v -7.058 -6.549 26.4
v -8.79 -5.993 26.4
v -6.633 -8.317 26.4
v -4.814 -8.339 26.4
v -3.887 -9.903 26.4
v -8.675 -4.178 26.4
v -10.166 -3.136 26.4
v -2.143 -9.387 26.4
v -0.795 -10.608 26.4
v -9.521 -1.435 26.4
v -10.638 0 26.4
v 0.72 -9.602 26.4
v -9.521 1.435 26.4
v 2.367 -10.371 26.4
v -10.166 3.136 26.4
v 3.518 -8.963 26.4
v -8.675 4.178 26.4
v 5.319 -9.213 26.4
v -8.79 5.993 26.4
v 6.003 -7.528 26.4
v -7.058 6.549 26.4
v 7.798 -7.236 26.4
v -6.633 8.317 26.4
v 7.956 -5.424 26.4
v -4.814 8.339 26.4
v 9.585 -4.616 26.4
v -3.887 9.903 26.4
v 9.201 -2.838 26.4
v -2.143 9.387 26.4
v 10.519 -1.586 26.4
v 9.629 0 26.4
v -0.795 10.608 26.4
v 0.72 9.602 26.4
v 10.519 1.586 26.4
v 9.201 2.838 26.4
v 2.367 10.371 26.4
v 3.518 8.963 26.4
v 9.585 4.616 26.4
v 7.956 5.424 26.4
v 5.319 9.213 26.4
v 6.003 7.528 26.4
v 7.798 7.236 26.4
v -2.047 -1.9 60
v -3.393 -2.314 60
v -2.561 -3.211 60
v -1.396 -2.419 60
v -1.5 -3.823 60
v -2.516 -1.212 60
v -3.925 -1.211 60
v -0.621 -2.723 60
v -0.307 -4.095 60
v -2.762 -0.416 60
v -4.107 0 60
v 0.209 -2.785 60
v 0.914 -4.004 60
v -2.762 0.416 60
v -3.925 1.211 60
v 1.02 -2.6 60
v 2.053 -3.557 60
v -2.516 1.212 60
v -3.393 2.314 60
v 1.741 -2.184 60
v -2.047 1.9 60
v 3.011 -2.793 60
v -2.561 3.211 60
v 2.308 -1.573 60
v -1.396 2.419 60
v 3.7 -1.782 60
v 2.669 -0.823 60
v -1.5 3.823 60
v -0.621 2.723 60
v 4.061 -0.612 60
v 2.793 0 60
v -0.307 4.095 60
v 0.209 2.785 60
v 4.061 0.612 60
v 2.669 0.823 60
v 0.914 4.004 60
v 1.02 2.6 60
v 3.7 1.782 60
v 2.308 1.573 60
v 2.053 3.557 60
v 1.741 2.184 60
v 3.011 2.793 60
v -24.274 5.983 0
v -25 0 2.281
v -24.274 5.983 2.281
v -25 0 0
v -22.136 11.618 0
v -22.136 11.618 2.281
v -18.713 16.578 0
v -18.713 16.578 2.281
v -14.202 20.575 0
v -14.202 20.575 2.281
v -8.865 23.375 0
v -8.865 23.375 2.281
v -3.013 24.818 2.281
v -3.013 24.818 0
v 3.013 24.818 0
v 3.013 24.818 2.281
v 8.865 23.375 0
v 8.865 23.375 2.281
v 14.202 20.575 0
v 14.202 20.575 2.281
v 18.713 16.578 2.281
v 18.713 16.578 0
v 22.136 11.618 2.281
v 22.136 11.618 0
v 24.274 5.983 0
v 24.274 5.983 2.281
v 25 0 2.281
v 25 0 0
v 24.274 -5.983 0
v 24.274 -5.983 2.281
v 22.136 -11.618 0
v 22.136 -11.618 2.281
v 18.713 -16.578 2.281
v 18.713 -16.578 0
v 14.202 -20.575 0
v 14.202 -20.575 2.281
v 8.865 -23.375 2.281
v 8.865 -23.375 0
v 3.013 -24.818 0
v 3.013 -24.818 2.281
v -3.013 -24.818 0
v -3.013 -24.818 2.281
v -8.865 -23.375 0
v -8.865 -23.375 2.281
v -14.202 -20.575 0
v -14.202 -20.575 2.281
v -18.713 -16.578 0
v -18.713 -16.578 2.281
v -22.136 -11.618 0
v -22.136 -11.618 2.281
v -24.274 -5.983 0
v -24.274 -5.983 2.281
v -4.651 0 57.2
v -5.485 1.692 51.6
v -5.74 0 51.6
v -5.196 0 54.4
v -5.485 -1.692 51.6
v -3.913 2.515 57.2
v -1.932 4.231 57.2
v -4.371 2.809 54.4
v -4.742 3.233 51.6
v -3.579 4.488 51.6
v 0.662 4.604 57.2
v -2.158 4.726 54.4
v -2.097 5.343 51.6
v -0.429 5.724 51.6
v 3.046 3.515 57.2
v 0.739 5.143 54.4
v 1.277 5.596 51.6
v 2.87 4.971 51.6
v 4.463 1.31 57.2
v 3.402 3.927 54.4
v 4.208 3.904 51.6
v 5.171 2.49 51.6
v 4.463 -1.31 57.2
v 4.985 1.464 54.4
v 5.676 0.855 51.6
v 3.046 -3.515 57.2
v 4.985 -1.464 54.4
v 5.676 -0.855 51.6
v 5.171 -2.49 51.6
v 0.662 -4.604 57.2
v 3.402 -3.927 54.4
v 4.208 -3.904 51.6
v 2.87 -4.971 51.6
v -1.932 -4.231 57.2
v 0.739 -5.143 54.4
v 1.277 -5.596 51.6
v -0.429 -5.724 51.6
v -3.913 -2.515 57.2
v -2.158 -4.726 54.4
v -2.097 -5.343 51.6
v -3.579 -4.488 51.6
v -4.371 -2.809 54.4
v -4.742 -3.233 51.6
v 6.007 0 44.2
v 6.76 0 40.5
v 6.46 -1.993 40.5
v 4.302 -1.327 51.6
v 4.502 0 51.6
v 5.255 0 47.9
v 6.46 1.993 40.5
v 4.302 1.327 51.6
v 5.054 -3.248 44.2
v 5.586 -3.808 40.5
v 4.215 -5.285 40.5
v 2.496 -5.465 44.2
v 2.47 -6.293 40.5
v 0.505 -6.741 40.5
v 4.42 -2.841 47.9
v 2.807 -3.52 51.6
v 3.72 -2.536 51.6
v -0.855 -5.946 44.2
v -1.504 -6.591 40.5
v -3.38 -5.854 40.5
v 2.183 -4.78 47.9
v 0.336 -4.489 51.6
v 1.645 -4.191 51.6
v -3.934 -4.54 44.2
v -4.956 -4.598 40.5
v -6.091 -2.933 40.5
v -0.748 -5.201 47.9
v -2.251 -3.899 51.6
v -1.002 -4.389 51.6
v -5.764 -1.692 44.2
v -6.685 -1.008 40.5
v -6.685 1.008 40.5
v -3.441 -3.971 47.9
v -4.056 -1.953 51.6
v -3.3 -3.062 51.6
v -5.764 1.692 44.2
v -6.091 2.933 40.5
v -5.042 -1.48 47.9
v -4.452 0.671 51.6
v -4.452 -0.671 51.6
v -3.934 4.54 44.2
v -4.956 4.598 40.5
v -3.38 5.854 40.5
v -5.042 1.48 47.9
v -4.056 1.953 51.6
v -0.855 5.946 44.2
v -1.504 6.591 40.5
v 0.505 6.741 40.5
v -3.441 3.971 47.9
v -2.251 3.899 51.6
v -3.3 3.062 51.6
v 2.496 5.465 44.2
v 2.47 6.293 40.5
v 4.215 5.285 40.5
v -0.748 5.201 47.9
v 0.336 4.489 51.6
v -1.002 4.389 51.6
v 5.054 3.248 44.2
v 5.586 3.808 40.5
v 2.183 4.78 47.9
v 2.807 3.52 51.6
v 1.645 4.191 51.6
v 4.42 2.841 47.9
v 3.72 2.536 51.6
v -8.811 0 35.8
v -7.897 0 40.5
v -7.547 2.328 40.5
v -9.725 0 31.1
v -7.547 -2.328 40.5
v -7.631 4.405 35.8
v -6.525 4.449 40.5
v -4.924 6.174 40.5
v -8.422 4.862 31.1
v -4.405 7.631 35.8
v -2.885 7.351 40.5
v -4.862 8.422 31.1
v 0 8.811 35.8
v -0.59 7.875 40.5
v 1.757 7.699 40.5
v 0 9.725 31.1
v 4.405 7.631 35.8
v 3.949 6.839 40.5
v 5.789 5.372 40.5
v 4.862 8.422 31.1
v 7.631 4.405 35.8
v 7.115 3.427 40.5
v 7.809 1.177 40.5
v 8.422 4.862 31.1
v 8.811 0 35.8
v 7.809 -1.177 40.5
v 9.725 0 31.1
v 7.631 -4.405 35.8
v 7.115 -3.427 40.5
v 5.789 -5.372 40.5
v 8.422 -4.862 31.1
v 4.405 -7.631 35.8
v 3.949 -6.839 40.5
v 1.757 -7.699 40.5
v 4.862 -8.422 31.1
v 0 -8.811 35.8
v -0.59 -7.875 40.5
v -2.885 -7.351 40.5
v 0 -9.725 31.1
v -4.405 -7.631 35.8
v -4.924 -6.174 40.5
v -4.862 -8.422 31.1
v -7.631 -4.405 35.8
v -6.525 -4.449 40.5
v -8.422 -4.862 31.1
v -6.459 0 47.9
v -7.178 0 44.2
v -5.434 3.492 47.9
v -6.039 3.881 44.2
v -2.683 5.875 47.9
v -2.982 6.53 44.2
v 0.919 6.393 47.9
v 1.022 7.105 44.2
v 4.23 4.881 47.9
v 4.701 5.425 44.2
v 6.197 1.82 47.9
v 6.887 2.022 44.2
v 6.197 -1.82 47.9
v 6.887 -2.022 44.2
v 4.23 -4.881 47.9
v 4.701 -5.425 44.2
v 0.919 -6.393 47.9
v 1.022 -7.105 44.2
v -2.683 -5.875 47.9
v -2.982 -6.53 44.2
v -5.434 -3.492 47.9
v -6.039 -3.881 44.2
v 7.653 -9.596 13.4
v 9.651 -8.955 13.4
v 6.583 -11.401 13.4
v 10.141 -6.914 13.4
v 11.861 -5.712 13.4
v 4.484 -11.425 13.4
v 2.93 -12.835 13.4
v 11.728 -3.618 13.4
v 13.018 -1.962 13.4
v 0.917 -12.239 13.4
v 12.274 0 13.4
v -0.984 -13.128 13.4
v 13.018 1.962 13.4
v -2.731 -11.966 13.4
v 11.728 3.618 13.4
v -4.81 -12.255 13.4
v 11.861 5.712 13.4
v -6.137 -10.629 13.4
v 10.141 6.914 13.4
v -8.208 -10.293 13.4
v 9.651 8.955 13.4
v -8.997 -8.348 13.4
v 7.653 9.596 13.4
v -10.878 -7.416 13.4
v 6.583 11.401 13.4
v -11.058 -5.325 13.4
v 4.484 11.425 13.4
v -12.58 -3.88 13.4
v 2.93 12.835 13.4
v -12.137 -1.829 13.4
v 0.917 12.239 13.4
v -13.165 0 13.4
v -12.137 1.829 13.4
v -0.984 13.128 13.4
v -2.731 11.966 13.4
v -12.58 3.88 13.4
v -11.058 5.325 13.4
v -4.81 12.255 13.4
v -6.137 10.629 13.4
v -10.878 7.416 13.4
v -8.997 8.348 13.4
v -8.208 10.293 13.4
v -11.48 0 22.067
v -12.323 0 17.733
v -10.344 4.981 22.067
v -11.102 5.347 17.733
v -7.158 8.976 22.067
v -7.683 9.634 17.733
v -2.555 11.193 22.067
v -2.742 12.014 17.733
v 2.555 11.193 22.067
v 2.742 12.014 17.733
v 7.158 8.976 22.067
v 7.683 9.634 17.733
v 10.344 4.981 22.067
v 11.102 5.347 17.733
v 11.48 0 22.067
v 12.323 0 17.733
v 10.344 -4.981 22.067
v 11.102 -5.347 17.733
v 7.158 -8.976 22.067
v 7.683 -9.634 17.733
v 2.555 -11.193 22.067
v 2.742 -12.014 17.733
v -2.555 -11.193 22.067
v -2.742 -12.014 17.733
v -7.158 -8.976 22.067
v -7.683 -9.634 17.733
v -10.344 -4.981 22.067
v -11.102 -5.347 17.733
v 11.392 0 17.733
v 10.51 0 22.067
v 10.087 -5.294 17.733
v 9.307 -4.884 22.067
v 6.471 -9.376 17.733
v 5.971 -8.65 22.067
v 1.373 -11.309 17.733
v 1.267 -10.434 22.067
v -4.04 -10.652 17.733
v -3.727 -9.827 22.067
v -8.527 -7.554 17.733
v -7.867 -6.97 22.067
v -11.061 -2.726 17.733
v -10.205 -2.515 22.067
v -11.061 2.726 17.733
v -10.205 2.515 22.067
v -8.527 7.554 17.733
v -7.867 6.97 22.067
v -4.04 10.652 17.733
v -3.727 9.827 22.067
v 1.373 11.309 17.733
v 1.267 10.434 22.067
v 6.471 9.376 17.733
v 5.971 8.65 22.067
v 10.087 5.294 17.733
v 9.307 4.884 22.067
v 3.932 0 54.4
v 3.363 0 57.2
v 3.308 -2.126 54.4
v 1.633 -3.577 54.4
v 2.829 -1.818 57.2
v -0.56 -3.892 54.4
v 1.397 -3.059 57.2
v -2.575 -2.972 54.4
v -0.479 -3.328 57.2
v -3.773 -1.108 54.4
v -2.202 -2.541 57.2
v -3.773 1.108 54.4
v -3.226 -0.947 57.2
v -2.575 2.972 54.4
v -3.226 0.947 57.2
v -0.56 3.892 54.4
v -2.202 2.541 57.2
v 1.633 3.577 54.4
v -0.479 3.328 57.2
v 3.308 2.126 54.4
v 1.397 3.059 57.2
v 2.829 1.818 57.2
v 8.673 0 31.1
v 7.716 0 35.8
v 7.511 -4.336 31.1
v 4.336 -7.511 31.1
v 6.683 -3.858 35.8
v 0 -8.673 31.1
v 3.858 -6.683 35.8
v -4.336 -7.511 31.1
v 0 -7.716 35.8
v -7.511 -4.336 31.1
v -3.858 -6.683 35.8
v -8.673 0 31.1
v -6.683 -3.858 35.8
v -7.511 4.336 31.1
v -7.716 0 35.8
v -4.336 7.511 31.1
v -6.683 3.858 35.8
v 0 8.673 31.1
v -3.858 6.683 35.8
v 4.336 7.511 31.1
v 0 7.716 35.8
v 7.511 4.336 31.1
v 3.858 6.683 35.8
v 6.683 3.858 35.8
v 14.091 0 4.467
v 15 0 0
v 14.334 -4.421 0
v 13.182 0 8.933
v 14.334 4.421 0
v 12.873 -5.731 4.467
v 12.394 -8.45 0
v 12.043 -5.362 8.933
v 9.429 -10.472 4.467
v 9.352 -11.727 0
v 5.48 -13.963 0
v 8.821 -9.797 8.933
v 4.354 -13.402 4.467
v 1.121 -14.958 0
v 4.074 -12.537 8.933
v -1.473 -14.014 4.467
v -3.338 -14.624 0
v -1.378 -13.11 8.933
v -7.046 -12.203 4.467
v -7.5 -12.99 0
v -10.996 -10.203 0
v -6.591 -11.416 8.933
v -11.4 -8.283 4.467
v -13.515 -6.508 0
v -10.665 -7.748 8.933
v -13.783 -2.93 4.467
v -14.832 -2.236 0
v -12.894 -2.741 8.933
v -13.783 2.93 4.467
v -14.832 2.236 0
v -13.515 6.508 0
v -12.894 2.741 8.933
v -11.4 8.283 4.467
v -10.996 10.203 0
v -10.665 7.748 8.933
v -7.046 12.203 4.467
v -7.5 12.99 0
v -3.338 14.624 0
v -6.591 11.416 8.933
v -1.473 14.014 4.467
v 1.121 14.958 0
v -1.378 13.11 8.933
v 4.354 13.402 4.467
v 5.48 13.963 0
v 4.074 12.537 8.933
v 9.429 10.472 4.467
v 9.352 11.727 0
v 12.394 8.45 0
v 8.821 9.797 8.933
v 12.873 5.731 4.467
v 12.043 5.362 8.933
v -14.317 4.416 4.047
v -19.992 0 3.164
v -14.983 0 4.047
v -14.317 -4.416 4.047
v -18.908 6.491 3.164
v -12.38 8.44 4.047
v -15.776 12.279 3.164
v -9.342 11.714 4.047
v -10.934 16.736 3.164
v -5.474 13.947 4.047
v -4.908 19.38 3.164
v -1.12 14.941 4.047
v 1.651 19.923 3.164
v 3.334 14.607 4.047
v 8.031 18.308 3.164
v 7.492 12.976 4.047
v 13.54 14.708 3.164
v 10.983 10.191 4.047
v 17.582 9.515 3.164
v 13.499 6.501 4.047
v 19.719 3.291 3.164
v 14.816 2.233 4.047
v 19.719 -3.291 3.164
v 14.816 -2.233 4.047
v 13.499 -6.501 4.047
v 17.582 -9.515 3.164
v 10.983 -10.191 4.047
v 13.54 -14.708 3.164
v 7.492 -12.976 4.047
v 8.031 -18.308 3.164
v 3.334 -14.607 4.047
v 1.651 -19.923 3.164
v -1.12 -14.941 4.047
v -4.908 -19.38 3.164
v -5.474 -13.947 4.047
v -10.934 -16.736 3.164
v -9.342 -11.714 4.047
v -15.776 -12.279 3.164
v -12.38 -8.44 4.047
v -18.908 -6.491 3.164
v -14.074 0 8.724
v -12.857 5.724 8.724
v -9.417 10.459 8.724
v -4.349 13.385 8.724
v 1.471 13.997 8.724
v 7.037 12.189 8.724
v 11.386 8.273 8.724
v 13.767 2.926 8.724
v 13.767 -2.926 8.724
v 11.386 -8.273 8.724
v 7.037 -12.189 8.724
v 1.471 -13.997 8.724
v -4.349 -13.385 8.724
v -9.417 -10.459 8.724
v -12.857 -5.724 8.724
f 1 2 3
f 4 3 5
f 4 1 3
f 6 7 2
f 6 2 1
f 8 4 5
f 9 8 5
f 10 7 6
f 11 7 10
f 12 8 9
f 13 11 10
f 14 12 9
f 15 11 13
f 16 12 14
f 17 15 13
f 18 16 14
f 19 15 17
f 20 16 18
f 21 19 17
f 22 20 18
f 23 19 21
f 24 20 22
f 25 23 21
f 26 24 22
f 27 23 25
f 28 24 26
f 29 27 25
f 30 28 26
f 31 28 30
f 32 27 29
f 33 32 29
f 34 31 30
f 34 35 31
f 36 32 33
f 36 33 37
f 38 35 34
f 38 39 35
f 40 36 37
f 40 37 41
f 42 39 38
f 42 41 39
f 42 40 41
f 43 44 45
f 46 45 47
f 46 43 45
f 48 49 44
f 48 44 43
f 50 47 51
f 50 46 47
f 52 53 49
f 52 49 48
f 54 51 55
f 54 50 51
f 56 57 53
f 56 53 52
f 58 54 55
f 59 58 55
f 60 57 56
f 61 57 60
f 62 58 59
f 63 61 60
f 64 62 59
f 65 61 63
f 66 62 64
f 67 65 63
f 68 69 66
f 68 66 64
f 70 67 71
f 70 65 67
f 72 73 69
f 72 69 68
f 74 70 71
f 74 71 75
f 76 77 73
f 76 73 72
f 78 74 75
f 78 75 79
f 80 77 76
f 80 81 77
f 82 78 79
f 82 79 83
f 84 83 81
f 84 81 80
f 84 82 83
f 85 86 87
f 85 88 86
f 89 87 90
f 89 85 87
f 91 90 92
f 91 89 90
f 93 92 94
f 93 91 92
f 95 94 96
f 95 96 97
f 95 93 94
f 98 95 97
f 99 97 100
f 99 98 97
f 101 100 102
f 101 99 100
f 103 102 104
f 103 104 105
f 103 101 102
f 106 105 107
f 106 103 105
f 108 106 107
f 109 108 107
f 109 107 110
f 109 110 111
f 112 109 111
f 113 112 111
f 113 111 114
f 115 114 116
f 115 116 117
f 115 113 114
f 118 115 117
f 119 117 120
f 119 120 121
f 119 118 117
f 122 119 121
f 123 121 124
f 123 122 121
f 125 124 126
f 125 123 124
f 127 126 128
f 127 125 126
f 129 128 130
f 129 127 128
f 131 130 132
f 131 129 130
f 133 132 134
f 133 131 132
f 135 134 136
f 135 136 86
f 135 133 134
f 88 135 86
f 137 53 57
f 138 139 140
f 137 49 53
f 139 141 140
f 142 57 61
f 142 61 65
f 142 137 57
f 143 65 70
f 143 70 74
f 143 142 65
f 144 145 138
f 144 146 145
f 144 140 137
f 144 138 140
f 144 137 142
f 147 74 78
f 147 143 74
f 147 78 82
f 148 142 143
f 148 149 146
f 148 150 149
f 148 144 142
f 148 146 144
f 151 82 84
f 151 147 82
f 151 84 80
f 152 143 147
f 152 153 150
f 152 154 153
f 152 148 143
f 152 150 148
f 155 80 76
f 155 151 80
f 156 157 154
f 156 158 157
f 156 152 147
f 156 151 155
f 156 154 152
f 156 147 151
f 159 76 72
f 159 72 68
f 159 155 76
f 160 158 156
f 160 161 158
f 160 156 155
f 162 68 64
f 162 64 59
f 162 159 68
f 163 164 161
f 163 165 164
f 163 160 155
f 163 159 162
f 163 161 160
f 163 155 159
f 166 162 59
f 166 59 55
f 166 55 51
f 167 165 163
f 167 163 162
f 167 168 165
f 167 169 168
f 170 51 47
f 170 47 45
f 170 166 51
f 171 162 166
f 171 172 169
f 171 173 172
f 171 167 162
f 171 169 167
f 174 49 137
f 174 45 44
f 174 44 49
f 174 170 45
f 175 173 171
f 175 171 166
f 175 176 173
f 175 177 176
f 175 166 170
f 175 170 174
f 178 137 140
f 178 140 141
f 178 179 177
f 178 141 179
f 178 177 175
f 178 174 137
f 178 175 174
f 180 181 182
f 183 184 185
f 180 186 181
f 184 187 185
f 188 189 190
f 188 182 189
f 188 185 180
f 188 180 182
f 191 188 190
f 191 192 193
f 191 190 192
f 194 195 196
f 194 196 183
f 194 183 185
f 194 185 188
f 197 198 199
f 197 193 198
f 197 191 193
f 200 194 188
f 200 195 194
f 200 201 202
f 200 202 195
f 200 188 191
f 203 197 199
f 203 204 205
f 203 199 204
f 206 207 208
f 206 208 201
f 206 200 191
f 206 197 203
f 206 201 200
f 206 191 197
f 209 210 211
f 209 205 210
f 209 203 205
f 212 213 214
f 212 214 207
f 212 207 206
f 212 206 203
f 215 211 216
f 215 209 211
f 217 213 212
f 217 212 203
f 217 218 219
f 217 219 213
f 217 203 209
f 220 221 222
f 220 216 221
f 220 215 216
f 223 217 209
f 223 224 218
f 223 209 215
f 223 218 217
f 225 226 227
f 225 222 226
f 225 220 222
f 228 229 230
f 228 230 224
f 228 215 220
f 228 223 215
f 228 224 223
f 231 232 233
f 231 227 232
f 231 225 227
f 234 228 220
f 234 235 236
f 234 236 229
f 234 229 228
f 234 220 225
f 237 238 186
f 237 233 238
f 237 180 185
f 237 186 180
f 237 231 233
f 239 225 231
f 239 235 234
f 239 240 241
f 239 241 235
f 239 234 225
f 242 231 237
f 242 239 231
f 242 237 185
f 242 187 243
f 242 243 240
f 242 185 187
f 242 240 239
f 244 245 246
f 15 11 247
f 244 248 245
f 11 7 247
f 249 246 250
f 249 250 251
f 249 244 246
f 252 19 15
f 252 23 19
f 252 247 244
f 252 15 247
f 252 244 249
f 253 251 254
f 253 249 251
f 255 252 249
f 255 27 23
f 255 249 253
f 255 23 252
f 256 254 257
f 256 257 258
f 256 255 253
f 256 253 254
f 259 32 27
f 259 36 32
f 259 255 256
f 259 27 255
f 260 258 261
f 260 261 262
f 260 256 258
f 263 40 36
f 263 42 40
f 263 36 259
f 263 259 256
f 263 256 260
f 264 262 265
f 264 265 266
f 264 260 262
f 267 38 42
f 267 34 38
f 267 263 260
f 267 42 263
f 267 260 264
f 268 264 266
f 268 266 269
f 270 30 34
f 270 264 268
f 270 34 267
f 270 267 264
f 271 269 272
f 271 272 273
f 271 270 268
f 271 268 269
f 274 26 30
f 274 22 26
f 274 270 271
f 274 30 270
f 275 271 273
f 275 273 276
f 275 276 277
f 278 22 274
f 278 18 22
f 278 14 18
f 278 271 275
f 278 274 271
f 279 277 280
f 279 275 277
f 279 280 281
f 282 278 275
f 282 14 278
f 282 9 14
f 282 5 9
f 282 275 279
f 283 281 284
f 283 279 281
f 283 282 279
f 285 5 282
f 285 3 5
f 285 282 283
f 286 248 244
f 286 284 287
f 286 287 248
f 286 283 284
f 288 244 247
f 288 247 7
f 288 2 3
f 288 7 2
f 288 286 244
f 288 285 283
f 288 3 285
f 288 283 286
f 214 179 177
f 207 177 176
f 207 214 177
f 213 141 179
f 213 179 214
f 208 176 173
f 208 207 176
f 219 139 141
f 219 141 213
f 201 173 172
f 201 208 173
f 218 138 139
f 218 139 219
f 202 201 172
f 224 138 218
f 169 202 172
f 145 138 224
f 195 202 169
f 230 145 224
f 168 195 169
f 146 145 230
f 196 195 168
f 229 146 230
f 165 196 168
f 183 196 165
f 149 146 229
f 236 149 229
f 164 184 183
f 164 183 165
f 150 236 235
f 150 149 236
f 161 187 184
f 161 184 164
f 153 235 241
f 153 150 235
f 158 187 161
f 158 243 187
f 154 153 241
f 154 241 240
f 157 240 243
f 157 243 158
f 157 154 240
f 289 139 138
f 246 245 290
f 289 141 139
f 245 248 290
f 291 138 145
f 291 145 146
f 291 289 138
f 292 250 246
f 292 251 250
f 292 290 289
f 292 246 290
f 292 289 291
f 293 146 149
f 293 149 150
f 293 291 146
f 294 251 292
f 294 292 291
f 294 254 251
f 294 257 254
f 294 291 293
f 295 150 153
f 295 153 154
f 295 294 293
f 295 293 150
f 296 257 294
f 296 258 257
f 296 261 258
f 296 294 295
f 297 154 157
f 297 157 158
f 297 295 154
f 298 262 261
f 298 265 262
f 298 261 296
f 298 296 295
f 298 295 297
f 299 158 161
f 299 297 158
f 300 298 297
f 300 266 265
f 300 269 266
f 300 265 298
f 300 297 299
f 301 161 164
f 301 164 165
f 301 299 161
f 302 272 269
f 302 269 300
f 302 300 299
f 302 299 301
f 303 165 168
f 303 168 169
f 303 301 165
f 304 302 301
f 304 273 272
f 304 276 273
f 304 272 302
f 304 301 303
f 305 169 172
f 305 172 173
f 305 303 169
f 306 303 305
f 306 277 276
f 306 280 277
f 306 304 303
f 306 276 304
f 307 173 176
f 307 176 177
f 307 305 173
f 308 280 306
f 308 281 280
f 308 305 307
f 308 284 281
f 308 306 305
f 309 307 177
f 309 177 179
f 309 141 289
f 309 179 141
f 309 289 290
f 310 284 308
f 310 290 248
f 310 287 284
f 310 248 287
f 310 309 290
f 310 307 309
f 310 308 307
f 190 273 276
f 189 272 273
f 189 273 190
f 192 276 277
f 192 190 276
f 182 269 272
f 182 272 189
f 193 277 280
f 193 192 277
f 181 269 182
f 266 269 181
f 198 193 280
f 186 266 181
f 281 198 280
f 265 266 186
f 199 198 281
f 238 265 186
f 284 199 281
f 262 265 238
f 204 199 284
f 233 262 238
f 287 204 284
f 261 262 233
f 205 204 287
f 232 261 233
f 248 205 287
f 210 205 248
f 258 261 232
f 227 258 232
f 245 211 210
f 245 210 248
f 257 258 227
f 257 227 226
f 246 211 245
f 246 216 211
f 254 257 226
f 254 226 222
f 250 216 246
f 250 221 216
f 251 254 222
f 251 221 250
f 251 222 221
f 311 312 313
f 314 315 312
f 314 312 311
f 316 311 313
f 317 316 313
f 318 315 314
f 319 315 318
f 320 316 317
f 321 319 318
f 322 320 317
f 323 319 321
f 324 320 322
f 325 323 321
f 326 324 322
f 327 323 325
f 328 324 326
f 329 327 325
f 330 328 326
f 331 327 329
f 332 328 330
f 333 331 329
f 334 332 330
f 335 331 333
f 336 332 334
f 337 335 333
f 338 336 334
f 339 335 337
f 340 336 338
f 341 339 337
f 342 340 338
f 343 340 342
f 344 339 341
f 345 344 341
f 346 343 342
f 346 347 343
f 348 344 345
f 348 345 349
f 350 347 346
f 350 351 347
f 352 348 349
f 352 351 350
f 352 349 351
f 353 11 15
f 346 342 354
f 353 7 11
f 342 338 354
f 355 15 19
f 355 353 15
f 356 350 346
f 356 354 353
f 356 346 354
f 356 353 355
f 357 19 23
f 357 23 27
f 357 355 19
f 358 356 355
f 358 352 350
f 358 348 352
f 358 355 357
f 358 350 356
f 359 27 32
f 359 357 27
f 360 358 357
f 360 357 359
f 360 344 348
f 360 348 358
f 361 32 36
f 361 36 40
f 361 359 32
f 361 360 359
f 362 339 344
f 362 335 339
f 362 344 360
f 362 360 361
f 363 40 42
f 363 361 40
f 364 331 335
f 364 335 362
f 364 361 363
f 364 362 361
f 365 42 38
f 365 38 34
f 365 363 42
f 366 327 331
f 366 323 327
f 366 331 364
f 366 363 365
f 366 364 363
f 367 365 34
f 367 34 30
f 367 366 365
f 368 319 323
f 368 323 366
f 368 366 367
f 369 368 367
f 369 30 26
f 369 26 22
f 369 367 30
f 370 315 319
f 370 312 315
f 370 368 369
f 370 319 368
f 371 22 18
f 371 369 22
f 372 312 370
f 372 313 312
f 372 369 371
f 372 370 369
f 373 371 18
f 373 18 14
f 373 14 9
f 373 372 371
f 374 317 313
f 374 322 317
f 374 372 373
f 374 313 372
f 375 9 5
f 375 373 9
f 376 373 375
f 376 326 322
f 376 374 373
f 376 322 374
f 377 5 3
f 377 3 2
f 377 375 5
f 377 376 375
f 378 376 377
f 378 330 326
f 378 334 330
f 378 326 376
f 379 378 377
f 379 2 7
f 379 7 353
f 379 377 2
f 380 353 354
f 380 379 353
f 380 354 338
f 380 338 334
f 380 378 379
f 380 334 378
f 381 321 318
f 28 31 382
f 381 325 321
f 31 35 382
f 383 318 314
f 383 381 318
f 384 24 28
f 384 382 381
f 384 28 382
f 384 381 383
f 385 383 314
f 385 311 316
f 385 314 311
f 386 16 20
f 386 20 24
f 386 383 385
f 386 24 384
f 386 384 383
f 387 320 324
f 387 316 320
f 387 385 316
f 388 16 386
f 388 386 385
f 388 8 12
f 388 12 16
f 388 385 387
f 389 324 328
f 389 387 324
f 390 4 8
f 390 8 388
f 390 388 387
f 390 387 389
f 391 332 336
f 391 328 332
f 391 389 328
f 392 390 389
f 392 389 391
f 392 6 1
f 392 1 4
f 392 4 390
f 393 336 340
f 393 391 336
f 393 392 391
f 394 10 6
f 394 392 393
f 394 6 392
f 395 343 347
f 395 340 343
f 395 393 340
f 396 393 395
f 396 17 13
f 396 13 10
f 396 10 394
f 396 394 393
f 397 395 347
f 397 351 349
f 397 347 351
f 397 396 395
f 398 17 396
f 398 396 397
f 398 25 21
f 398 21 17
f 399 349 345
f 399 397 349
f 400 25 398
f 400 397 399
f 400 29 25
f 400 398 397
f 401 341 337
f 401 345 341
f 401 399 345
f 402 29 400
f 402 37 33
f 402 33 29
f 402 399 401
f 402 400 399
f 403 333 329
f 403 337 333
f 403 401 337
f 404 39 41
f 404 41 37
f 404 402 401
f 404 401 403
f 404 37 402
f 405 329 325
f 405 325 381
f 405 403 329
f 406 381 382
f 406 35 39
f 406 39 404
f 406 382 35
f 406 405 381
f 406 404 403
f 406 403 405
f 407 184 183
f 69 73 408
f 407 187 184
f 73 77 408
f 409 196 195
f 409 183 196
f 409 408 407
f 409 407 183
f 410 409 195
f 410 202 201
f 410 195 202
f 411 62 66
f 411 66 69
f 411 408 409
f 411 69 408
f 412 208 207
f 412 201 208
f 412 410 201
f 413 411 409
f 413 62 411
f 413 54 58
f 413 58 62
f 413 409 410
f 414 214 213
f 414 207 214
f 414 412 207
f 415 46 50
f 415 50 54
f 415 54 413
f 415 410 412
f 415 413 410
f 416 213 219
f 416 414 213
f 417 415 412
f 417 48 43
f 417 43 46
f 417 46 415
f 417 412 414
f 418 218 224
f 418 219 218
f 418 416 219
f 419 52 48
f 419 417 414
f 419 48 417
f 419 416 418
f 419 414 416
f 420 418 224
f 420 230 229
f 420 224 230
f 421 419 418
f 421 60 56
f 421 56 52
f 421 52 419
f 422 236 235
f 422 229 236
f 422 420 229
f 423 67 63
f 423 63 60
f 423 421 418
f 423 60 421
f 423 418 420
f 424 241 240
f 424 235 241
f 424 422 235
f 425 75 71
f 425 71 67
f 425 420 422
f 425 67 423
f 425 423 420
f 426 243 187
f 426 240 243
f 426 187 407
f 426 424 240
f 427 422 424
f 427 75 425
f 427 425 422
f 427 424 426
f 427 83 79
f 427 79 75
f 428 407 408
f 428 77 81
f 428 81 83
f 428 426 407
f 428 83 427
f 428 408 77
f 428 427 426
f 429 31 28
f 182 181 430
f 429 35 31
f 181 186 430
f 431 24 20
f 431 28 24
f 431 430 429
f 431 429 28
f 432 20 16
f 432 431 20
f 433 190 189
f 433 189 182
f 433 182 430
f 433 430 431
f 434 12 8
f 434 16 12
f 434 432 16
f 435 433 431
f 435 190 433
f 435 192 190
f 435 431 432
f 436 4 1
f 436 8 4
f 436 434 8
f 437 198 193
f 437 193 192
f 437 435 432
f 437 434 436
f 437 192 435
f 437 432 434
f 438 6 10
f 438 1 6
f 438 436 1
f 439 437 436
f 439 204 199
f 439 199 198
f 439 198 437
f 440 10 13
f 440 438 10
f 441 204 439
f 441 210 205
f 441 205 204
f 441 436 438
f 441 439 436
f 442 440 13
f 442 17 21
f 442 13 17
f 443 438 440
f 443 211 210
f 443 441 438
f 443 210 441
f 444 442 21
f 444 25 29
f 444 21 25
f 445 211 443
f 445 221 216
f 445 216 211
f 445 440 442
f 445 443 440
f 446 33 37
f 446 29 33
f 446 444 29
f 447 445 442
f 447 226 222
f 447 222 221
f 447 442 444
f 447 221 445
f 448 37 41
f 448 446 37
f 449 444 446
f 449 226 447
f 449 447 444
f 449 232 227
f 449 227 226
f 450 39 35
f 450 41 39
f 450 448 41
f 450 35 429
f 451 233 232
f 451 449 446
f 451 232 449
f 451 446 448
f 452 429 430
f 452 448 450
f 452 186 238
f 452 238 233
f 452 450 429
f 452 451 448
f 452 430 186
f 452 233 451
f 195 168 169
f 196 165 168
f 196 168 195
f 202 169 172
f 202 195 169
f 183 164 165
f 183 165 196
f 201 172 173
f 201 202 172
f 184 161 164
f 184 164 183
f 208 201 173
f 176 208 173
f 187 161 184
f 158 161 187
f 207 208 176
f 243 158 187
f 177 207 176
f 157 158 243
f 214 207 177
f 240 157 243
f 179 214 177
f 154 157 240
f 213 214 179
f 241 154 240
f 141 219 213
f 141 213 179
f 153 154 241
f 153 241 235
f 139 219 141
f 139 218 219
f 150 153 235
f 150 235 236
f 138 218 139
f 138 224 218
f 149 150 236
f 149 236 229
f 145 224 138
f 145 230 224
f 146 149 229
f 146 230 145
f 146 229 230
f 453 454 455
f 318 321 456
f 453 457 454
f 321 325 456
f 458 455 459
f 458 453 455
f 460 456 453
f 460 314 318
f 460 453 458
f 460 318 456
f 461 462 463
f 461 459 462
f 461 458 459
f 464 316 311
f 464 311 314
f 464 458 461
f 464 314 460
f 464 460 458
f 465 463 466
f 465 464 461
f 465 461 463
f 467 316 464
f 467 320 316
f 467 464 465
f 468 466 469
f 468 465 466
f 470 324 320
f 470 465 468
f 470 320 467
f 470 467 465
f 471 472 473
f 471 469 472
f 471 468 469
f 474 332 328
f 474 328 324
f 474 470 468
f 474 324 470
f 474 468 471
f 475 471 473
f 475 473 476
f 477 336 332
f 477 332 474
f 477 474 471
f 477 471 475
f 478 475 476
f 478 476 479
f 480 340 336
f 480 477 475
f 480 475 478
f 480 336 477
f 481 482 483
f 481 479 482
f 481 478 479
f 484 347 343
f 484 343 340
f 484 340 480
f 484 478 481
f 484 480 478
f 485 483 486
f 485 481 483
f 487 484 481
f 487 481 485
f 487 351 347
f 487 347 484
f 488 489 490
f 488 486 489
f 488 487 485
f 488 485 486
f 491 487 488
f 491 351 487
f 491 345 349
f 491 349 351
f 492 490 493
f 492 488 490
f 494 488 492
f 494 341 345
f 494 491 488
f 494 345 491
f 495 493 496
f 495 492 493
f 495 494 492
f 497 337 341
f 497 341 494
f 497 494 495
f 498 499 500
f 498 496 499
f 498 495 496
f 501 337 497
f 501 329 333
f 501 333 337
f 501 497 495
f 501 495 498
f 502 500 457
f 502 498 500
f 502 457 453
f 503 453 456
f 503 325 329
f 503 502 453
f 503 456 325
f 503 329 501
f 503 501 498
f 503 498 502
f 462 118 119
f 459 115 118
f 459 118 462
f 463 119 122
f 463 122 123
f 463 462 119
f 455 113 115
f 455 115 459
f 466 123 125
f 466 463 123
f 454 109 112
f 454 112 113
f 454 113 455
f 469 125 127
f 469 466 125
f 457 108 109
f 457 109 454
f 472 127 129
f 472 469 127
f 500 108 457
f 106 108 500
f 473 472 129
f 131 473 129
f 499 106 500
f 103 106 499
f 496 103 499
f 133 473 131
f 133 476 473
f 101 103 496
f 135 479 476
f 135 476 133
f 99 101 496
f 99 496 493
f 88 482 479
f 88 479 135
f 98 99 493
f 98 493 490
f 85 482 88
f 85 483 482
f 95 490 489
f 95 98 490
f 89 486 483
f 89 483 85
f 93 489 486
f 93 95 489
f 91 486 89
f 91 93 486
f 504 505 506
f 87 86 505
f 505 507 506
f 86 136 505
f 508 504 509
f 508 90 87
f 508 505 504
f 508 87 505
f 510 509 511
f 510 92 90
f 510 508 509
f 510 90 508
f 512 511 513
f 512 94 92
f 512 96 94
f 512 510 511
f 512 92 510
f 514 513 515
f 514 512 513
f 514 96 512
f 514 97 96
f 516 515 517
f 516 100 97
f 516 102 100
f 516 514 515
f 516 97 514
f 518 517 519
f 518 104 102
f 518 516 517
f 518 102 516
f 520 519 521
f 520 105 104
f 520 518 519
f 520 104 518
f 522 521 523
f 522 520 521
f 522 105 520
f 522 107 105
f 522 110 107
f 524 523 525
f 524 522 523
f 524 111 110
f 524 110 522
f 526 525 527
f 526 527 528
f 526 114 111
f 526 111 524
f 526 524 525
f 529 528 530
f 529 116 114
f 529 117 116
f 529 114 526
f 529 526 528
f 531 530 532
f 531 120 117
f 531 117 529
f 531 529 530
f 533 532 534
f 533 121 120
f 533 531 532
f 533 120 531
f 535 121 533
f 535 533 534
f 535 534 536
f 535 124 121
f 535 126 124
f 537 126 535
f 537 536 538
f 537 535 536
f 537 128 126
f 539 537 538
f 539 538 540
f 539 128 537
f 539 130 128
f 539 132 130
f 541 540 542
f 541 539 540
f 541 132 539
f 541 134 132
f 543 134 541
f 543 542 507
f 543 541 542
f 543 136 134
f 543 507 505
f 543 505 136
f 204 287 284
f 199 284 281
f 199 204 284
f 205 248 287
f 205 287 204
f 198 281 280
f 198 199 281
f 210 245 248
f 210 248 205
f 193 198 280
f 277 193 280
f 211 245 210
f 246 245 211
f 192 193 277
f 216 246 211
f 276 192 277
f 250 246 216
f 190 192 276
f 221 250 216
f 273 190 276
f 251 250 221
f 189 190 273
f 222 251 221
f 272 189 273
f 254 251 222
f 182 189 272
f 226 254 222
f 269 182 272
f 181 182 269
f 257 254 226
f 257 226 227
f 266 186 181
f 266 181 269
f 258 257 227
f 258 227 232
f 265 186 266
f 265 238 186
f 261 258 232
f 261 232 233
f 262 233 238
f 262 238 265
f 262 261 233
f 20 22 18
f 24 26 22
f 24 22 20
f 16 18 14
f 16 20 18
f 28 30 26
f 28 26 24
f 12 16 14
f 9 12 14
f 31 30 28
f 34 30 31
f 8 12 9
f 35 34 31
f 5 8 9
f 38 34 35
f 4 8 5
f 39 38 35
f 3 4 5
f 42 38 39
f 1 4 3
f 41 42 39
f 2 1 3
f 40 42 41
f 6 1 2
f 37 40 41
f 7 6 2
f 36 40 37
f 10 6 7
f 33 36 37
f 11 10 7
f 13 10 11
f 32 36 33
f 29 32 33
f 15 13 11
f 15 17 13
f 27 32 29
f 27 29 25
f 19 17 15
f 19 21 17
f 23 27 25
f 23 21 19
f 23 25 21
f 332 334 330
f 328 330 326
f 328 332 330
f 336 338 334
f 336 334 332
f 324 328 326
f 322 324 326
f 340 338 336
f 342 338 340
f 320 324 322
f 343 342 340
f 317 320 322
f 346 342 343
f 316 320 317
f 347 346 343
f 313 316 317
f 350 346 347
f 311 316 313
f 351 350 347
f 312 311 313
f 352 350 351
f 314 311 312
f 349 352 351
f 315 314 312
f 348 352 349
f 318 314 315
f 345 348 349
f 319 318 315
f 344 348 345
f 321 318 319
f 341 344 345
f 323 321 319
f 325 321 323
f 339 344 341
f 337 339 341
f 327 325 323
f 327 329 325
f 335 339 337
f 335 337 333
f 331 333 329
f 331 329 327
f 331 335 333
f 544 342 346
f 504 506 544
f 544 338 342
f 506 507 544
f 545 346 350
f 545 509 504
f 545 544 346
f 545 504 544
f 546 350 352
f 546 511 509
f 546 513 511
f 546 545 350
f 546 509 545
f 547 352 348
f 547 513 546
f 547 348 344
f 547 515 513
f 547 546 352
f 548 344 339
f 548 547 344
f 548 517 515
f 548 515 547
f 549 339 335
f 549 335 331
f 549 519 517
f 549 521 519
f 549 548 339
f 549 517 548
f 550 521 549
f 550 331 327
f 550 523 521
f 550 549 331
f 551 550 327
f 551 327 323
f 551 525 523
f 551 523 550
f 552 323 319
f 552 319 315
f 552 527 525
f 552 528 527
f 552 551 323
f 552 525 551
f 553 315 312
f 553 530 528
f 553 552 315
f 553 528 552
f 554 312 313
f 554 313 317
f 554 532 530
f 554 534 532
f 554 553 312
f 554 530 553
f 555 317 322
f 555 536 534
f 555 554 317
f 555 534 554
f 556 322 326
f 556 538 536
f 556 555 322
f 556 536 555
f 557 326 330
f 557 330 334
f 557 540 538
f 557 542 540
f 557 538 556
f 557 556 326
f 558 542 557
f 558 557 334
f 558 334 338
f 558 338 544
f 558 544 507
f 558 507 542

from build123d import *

# Parameters (mm, degrees)
F6_R     = 15
F7_DEPTH = 62.23
F7_TAPER = 11.5


with BuildPart() as f1:
    # F0 (on Front) → F1 (revolve)
    with BuildSketch(Plane.XZ):
        Polygon((-5.7397772641, 51.6), (0, 51.6), (0, 60), (-4.1069826674, 60), align=None)
    revolve(axis=Axis((0, 0, 30), (0, 0, -1)))


with BuildPart() as f2:
    # F0 (on Front) → F2 (revolve)
    with BuildSketch(Plane.XZ):
        Polygon((-7.8973986956, 40.5), (0, 40.5), (0, 51.6), (-5.7397772641, 51.6), align=None)
    revolve(axis=Axis((0, 0, 30), (0, 0, -1)))


with BuildPart() as f3:
    # F0 (on Front) → F3 (revolve)
    with BuildSketch(Plane.XZ):
        Polygon((-10.6381610544, 26.4), (0, 26.4), (0, 40.5), (-7.8973986956, 40.5), align=None)
    revolve(axis=Axis((0, 0, 30), (0, 0, -1)))


with BuildPart() as f4:
    # F0 (on Front) → F4 (revolve)
    with BuildSketch(Plane.XZ):
        Polygon((-13.1651050732, 13.4), (0, 13.4), (0, 26.4), (-10.6381610544, 26.4), align=None)
    revolve(axis=Axis((0, 0, 30), (0, 0, -1)))


with BuildPart() as f5:
    # F0 (on Front) → F5 (revolve)
    with BuildSketch(Plane.XZ):
        Polygon((-25, 2.281), (-25, 0), (0, 0), (0, 13.4), (-13.1651050732, 13.4), (-14.9830954039, 4.0472505435), align=None)
    revolve(axis=Axis((0, 0, 30), (0, 0, -1)))


with BuildPart() as f7_tool:
    # F6 (on face) → F7 (new body)
    with BuildSketch(Plane(origin=(0, 0, 0), x_dir=(1, 0, 0), z_dir=(0, 0, -1))):
        Circle(F6_R)
    extrude(amount=-F7_DEPTH, taper=F7_TAPER)


with BuildPart() as f1_1:
    add(f1.part)

    # F7: cut by f7_tool
    add(f7_tool.part, mode=Mode.SUBTRACT)


with BuildPart() as f2_1:
    add(f2.part)

    # F7: cut by f7_tool
    add(f7_tool.part, mode=Mode.SUBTRACT)


with BuildPart() as f3_1:
    add(f3.part)

    # F7: cut by f7_tool
    add(f7_tool.part, mode=Mode.SUBTRACT)


with BuildPart() as f4_1:
    add(f4.part)

    # F7: cut by f7_tool
    add(f7_tool.part, mode=Mode.SUBTRACT)


with BuildPart() as f5_1:
    add(f5.part)

    # F7: cut by f7_tool
    add(f7_tool.part, mode=Mode.SUBTRACT)


solid = Compound([f1_1.part, f2_1.part, f3_1.part, f4_1.part, f5_1.part])
